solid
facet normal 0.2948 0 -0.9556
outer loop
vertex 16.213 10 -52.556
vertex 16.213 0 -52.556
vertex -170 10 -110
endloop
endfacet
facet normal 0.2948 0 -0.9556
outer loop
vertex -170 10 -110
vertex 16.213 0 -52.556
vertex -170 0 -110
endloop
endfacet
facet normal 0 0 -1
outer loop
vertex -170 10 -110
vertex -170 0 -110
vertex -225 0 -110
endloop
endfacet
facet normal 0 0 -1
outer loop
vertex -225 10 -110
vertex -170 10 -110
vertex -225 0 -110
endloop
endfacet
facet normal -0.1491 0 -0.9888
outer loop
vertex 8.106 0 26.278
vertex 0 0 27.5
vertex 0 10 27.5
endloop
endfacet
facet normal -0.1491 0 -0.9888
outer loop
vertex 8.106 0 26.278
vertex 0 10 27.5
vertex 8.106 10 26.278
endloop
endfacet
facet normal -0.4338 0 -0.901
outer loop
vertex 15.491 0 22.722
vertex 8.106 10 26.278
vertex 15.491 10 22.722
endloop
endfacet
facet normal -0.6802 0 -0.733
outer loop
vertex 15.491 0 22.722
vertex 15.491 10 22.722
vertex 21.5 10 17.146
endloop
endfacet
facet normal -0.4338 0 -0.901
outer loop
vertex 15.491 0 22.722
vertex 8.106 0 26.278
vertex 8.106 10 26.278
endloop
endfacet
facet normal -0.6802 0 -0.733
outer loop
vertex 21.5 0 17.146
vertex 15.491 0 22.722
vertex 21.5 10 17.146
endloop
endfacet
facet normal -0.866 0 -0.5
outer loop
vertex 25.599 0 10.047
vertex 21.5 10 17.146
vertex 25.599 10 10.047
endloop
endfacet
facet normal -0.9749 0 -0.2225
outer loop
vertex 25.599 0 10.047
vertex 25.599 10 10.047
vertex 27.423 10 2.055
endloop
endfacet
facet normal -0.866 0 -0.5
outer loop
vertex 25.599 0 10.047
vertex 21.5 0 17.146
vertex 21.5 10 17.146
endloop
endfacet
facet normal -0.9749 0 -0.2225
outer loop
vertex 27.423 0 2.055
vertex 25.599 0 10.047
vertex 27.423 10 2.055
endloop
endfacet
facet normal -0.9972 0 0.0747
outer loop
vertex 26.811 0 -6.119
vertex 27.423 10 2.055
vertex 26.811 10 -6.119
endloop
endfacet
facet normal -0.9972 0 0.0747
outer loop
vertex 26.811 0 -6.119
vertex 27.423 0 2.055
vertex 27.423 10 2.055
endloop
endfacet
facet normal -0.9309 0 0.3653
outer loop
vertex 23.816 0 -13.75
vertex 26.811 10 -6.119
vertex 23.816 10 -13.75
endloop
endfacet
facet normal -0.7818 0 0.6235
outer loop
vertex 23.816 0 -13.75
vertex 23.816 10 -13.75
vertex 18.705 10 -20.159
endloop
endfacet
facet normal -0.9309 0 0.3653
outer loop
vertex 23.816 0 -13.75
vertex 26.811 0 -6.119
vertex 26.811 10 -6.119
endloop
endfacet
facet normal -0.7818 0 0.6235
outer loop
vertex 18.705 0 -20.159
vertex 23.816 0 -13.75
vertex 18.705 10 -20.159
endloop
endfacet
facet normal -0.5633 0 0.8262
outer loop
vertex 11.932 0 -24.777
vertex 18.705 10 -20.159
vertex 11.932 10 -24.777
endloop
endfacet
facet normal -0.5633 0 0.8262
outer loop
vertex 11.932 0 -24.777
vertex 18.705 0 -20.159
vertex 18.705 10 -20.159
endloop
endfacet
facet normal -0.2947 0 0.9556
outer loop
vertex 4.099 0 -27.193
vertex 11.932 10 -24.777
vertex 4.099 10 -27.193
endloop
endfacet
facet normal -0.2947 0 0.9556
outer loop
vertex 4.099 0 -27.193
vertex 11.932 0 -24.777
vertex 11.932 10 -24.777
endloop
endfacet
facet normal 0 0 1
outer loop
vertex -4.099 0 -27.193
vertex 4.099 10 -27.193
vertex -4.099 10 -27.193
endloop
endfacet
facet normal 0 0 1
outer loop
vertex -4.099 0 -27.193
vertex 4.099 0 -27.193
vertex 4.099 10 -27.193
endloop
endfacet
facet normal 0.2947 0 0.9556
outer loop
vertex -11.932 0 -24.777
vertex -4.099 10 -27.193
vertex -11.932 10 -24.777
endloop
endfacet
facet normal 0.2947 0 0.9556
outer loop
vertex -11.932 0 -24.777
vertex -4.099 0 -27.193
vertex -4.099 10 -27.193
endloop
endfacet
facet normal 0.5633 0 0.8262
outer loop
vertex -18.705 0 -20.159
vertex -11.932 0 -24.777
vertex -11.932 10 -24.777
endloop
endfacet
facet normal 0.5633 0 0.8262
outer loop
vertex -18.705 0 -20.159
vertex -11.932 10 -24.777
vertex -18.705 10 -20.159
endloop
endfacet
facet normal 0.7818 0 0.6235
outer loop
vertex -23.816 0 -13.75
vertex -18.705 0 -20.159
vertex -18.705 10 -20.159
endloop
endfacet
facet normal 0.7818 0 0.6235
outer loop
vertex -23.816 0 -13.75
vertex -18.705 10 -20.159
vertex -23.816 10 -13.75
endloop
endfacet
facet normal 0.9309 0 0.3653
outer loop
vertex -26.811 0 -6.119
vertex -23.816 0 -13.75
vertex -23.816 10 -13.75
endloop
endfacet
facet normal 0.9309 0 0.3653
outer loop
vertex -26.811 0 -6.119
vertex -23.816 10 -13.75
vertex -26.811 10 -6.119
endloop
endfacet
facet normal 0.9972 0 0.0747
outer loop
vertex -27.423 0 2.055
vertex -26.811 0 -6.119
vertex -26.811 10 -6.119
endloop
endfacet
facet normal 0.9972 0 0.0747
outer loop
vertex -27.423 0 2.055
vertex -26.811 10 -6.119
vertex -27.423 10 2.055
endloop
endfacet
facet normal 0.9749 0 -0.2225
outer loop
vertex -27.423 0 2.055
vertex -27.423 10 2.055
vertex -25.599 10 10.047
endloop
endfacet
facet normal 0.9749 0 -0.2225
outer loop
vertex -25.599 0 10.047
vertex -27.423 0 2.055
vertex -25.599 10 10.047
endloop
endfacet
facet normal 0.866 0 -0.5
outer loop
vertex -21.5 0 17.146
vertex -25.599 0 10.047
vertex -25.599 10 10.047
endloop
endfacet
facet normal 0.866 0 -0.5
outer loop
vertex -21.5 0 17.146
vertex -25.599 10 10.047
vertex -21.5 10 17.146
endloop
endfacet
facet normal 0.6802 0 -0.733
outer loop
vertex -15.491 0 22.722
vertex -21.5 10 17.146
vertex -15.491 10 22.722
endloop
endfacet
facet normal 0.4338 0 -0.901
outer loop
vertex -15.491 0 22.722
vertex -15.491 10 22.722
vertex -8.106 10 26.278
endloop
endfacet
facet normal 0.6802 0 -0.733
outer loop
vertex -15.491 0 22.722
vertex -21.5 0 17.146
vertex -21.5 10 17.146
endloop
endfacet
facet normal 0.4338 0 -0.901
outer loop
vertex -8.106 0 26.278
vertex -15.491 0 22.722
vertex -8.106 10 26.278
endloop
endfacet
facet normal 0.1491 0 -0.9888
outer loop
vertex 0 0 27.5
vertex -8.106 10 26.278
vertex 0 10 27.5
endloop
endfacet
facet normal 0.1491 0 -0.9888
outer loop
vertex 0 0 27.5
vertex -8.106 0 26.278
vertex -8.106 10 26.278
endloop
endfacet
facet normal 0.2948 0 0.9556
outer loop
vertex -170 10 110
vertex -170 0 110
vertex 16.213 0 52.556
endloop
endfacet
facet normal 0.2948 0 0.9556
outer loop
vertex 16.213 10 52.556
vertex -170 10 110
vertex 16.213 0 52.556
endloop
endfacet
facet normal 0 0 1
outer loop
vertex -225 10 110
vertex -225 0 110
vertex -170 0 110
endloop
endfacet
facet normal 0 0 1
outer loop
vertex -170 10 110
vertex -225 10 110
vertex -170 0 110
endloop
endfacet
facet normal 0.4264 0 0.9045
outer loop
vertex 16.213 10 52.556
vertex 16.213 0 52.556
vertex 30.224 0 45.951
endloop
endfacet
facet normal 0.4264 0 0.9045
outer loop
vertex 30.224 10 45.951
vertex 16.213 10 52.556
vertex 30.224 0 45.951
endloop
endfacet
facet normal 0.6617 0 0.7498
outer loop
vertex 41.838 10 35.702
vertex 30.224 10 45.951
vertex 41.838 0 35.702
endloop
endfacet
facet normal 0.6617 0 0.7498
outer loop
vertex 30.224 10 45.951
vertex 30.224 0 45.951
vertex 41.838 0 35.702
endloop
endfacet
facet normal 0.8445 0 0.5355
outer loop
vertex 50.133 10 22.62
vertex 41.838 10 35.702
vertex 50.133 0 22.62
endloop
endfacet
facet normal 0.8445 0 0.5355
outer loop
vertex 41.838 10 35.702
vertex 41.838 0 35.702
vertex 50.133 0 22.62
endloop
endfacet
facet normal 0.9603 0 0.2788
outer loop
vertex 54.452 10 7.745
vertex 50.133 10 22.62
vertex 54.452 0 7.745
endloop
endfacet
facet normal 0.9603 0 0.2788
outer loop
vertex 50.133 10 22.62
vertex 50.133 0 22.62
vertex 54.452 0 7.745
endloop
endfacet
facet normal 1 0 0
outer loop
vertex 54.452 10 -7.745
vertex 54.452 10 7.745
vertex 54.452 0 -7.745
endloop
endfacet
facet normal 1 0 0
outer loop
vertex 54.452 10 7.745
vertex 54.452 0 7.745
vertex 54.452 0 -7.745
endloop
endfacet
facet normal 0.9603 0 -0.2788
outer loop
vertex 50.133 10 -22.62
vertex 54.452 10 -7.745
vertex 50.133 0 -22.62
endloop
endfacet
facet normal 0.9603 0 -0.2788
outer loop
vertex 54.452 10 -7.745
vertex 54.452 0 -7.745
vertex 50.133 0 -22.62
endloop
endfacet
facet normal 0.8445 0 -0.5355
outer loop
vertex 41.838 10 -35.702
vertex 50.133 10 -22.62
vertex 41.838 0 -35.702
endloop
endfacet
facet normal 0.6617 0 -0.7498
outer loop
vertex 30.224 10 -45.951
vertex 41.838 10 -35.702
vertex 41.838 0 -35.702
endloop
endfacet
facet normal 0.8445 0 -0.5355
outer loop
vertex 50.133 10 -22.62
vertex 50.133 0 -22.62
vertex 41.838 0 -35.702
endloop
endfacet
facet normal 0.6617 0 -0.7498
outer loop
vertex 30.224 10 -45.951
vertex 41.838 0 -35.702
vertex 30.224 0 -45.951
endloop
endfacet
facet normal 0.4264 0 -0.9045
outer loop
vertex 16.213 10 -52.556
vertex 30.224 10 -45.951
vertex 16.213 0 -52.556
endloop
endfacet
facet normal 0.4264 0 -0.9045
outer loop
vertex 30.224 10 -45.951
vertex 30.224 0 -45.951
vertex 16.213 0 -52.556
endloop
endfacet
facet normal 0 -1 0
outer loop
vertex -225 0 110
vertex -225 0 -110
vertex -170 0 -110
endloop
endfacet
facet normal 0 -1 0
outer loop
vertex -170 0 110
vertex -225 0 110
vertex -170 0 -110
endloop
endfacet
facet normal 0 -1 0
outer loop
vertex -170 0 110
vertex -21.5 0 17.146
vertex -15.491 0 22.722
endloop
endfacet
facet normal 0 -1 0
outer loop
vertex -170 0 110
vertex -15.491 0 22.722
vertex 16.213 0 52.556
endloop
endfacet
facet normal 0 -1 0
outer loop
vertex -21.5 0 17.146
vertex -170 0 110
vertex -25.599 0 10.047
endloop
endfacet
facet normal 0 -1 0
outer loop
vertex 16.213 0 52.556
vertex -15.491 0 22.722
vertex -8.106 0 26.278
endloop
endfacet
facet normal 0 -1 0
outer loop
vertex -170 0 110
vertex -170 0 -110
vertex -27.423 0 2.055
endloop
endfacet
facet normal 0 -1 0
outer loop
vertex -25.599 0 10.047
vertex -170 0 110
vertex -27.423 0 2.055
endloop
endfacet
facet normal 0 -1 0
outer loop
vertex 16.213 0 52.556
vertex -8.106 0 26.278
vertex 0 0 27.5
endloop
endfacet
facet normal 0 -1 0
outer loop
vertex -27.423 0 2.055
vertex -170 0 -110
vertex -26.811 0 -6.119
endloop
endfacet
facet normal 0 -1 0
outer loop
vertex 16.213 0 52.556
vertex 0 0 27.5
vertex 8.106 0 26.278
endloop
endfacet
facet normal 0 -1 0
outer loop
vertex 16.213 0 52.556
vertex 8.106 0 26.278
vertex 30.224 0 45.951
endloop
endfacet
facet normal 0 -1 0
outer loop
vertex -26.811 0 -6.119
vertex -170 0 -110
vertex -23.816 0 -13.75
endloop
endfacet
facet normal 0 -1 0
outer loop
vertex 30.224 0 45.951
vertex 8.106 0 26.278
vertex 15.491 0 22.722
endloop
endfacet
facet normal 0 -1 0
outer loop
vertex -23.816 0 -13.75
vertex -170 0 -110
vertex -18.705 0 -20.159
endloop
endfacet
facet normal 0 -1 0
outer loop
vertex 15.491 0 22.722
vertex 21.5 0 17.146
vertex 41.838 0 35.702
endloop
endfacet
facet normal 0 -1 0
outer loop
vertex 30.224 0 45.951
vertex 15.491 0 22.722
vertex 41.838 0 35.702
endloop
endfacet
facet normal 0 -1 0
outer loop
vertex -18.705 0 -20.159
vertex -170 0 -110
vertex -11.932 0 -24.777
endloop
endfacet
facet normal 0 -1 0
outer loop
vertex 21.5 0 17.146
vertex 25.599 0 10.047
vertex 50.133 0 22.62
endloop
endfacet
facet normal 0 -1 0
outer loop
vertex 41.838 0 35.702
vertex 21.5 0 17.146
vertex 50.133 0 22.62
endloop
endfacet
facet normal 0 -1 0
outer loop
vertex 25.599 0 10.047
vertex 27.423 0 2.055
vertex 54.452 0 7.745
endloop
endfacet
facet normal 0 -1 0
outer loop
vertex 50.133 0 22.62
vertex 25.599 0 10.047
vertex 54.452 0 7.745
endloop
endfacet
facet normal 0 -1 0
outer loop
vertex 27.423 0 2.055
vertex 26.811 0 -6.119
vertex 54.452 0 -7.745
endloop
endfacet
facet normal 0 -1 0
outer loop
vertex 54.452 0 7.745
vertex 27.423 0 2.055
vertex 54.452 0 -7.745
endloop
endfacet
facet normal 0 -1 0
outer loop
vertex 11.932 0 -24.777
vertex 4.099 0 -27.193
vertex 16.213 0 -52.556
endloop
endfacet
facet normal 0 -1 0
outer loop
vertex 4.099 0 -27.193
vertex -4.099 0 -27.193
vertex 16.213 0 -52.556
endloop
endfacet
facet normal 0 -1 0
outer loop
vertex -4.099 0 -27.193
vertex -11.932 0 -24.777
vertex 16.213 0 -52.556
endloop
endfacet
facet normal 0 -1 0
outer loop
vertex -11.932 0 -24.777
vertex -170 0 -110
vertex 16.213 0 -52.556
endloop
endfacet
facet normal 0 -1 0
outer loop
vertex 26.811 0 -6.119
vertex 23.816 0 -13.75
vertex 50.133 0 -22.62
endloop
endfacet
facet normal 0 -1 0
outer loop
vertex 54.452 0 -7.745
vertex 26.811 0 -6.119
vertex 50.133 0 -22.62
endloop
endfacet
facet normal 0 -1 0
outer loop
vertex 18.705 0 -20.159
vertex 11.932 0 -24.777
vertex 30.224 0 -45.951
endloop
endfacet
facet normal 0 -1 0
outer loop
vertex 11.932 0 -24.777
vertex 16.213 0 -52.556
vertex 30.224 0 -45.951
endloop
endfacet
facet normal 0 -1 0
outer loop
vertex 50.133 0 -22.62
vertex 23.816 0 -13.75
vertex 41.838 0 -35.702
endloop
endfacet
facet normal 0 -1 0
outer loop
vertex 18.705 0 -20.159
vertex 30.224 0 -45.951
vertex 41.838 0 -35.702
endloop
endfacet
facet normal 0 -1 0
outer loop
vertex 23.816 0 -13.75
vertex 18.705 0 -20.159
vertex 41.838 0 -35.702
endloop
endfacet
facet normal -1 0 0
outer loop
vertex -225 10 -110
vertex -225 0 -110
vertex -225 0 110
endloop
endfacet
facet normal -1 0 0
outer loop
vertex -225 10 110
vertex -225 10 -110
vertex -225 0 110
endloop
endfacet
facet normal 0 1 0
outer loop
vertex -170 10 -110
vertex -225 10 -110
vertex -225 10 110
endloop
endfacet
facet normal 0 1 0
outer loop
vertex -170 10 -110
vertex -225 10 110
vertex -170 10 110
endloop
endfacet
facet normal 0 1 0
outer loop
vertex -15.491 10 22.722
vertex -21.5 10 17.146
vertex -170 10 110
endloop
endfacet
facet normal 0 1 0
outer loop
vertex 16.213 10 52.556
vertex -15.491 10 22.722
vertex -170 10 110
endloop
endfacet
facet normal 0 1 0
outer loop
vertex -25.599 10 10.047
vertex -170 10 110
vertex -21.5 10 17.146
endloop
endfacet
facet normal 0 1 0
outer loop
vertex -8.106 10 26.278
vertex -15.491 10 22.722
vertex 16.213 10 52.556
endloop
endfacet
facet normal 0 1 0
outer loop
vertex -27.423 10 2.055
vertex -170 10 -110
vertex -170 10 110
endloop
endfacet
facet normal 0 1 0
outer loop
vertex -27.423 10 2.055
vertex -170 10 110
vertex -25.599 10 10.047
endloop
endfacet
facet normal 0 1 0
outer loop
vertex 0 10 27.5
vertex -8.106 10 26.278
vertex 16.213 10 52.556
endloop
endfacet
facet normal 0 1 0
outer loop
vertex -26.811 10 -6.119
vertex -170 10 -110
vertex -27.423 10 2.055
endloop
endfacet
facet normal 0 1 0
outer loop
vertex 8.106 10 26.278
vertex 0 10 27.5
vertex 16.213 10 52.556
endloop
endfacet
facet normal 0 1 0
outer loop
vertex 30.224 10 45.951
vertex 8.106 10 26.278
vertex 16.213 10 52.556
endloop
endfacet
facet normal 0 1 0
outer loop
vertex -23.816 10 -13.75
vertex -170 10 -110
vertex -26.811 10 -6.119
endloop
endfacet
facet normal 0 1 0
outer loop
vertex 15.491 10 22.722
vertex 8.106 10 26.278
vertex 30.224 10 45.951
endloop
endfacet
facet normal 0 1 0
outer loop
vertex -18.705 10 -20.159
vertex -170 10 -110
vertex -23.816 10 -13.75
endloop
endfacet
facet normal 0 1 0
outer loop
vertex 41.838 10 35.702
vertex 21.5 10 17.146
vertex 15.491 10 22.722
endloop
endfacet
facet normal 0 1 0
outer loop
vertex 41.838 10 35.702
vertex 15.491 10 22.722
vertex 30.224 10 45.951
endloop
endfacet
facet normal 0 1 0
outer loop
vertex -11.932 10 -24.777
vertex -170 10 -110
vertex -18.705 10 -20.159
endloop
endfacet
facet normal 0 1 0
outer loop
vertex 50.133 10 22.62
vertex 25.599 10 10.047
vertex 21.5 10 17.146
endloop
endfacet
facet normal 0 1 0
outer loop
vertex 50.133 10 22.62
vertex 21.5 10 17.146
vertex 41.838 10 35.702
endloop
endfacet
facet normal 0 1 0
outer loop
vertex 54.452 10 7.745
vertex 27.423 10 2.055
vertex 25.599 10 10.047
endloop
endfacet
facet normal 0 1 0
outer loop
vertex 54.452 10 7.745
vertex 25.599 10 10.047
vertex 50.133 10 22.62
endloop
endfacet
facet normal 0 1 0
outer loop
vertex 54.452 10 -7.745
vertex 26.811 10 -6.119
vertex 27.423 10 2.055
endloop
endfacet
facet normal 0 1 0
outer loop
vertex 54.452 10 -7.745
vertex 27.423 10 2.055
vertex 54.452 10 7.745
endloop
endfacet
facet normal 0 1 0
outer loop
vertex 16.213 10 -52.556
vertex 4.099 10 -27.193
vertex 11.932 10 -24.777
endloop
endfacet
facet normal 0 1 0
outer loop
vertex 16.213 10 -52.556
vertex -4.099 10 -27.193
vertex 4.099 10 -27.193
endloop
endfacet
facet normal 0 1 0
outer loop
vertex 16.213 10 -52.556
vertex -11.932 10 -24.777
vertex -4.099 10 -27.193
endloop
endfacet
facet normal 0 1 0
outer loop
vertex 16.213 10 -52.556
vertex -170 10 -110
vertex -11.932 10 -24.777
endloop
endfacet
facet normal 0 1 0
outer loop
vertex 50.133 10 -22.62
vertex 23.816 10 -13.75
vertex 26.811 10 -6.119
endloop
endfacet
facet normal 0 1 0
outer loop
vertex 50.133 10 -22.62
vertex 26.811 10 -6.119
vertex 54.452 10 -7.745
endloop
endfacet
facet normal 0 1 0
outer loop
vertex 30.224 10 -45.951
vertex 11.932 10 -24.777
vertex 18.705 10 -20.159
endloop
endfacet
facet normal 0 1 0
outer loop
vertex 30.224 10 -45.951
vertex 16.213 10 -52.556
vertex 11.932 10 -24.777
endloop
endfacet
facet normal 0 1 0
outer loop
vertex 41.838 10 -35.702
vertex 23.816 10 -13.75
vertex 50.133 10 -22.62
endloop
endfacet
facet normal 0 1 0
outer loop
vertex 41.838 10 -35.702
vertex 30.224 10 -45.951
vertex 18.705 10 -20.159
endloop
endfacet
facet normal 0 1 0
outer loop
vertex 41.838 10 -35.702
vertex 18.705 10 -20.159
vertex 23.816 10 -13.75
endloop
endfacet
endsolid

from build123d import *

# Parameters (mm, degrees)
SKETCH_W_DIMENSIONS_R = 27.5
EXTRUDE_10MM_DEPTH    = 10


with BuildPart() as part:
    # sketch_w_dimensions → extrude_10mm (new body)
    with BuildSketch(Plane(origin=(0, 0, 0), x_dir=(1, 0, 0), z_dir=(0, 1, 0))):
        with BuildLine():
            Line((-225, 110), (-225, -110))
            Line((-225, -110), (-170, -110))
            Line((-170, -110), (16.21278302, -52.556119213))
            ThreePointArc((16.21278302, -52.556119213), (55, 0), (16.21278302, 52.556119213))
            Line((16.21278302, 52.556119213), (-170, 110))
            Line((-170, 110), (-225, 110))
        make_face()
        with Locations(Location((0, 0, 0), (0, 0, 270))):
            Circle(SKETCH_W_DIMENSIONS_R, mode=Mode.SUBTRACT)
    extrude(amount=EXTRUDE_10MM_DEPTH)


solid = part.part
